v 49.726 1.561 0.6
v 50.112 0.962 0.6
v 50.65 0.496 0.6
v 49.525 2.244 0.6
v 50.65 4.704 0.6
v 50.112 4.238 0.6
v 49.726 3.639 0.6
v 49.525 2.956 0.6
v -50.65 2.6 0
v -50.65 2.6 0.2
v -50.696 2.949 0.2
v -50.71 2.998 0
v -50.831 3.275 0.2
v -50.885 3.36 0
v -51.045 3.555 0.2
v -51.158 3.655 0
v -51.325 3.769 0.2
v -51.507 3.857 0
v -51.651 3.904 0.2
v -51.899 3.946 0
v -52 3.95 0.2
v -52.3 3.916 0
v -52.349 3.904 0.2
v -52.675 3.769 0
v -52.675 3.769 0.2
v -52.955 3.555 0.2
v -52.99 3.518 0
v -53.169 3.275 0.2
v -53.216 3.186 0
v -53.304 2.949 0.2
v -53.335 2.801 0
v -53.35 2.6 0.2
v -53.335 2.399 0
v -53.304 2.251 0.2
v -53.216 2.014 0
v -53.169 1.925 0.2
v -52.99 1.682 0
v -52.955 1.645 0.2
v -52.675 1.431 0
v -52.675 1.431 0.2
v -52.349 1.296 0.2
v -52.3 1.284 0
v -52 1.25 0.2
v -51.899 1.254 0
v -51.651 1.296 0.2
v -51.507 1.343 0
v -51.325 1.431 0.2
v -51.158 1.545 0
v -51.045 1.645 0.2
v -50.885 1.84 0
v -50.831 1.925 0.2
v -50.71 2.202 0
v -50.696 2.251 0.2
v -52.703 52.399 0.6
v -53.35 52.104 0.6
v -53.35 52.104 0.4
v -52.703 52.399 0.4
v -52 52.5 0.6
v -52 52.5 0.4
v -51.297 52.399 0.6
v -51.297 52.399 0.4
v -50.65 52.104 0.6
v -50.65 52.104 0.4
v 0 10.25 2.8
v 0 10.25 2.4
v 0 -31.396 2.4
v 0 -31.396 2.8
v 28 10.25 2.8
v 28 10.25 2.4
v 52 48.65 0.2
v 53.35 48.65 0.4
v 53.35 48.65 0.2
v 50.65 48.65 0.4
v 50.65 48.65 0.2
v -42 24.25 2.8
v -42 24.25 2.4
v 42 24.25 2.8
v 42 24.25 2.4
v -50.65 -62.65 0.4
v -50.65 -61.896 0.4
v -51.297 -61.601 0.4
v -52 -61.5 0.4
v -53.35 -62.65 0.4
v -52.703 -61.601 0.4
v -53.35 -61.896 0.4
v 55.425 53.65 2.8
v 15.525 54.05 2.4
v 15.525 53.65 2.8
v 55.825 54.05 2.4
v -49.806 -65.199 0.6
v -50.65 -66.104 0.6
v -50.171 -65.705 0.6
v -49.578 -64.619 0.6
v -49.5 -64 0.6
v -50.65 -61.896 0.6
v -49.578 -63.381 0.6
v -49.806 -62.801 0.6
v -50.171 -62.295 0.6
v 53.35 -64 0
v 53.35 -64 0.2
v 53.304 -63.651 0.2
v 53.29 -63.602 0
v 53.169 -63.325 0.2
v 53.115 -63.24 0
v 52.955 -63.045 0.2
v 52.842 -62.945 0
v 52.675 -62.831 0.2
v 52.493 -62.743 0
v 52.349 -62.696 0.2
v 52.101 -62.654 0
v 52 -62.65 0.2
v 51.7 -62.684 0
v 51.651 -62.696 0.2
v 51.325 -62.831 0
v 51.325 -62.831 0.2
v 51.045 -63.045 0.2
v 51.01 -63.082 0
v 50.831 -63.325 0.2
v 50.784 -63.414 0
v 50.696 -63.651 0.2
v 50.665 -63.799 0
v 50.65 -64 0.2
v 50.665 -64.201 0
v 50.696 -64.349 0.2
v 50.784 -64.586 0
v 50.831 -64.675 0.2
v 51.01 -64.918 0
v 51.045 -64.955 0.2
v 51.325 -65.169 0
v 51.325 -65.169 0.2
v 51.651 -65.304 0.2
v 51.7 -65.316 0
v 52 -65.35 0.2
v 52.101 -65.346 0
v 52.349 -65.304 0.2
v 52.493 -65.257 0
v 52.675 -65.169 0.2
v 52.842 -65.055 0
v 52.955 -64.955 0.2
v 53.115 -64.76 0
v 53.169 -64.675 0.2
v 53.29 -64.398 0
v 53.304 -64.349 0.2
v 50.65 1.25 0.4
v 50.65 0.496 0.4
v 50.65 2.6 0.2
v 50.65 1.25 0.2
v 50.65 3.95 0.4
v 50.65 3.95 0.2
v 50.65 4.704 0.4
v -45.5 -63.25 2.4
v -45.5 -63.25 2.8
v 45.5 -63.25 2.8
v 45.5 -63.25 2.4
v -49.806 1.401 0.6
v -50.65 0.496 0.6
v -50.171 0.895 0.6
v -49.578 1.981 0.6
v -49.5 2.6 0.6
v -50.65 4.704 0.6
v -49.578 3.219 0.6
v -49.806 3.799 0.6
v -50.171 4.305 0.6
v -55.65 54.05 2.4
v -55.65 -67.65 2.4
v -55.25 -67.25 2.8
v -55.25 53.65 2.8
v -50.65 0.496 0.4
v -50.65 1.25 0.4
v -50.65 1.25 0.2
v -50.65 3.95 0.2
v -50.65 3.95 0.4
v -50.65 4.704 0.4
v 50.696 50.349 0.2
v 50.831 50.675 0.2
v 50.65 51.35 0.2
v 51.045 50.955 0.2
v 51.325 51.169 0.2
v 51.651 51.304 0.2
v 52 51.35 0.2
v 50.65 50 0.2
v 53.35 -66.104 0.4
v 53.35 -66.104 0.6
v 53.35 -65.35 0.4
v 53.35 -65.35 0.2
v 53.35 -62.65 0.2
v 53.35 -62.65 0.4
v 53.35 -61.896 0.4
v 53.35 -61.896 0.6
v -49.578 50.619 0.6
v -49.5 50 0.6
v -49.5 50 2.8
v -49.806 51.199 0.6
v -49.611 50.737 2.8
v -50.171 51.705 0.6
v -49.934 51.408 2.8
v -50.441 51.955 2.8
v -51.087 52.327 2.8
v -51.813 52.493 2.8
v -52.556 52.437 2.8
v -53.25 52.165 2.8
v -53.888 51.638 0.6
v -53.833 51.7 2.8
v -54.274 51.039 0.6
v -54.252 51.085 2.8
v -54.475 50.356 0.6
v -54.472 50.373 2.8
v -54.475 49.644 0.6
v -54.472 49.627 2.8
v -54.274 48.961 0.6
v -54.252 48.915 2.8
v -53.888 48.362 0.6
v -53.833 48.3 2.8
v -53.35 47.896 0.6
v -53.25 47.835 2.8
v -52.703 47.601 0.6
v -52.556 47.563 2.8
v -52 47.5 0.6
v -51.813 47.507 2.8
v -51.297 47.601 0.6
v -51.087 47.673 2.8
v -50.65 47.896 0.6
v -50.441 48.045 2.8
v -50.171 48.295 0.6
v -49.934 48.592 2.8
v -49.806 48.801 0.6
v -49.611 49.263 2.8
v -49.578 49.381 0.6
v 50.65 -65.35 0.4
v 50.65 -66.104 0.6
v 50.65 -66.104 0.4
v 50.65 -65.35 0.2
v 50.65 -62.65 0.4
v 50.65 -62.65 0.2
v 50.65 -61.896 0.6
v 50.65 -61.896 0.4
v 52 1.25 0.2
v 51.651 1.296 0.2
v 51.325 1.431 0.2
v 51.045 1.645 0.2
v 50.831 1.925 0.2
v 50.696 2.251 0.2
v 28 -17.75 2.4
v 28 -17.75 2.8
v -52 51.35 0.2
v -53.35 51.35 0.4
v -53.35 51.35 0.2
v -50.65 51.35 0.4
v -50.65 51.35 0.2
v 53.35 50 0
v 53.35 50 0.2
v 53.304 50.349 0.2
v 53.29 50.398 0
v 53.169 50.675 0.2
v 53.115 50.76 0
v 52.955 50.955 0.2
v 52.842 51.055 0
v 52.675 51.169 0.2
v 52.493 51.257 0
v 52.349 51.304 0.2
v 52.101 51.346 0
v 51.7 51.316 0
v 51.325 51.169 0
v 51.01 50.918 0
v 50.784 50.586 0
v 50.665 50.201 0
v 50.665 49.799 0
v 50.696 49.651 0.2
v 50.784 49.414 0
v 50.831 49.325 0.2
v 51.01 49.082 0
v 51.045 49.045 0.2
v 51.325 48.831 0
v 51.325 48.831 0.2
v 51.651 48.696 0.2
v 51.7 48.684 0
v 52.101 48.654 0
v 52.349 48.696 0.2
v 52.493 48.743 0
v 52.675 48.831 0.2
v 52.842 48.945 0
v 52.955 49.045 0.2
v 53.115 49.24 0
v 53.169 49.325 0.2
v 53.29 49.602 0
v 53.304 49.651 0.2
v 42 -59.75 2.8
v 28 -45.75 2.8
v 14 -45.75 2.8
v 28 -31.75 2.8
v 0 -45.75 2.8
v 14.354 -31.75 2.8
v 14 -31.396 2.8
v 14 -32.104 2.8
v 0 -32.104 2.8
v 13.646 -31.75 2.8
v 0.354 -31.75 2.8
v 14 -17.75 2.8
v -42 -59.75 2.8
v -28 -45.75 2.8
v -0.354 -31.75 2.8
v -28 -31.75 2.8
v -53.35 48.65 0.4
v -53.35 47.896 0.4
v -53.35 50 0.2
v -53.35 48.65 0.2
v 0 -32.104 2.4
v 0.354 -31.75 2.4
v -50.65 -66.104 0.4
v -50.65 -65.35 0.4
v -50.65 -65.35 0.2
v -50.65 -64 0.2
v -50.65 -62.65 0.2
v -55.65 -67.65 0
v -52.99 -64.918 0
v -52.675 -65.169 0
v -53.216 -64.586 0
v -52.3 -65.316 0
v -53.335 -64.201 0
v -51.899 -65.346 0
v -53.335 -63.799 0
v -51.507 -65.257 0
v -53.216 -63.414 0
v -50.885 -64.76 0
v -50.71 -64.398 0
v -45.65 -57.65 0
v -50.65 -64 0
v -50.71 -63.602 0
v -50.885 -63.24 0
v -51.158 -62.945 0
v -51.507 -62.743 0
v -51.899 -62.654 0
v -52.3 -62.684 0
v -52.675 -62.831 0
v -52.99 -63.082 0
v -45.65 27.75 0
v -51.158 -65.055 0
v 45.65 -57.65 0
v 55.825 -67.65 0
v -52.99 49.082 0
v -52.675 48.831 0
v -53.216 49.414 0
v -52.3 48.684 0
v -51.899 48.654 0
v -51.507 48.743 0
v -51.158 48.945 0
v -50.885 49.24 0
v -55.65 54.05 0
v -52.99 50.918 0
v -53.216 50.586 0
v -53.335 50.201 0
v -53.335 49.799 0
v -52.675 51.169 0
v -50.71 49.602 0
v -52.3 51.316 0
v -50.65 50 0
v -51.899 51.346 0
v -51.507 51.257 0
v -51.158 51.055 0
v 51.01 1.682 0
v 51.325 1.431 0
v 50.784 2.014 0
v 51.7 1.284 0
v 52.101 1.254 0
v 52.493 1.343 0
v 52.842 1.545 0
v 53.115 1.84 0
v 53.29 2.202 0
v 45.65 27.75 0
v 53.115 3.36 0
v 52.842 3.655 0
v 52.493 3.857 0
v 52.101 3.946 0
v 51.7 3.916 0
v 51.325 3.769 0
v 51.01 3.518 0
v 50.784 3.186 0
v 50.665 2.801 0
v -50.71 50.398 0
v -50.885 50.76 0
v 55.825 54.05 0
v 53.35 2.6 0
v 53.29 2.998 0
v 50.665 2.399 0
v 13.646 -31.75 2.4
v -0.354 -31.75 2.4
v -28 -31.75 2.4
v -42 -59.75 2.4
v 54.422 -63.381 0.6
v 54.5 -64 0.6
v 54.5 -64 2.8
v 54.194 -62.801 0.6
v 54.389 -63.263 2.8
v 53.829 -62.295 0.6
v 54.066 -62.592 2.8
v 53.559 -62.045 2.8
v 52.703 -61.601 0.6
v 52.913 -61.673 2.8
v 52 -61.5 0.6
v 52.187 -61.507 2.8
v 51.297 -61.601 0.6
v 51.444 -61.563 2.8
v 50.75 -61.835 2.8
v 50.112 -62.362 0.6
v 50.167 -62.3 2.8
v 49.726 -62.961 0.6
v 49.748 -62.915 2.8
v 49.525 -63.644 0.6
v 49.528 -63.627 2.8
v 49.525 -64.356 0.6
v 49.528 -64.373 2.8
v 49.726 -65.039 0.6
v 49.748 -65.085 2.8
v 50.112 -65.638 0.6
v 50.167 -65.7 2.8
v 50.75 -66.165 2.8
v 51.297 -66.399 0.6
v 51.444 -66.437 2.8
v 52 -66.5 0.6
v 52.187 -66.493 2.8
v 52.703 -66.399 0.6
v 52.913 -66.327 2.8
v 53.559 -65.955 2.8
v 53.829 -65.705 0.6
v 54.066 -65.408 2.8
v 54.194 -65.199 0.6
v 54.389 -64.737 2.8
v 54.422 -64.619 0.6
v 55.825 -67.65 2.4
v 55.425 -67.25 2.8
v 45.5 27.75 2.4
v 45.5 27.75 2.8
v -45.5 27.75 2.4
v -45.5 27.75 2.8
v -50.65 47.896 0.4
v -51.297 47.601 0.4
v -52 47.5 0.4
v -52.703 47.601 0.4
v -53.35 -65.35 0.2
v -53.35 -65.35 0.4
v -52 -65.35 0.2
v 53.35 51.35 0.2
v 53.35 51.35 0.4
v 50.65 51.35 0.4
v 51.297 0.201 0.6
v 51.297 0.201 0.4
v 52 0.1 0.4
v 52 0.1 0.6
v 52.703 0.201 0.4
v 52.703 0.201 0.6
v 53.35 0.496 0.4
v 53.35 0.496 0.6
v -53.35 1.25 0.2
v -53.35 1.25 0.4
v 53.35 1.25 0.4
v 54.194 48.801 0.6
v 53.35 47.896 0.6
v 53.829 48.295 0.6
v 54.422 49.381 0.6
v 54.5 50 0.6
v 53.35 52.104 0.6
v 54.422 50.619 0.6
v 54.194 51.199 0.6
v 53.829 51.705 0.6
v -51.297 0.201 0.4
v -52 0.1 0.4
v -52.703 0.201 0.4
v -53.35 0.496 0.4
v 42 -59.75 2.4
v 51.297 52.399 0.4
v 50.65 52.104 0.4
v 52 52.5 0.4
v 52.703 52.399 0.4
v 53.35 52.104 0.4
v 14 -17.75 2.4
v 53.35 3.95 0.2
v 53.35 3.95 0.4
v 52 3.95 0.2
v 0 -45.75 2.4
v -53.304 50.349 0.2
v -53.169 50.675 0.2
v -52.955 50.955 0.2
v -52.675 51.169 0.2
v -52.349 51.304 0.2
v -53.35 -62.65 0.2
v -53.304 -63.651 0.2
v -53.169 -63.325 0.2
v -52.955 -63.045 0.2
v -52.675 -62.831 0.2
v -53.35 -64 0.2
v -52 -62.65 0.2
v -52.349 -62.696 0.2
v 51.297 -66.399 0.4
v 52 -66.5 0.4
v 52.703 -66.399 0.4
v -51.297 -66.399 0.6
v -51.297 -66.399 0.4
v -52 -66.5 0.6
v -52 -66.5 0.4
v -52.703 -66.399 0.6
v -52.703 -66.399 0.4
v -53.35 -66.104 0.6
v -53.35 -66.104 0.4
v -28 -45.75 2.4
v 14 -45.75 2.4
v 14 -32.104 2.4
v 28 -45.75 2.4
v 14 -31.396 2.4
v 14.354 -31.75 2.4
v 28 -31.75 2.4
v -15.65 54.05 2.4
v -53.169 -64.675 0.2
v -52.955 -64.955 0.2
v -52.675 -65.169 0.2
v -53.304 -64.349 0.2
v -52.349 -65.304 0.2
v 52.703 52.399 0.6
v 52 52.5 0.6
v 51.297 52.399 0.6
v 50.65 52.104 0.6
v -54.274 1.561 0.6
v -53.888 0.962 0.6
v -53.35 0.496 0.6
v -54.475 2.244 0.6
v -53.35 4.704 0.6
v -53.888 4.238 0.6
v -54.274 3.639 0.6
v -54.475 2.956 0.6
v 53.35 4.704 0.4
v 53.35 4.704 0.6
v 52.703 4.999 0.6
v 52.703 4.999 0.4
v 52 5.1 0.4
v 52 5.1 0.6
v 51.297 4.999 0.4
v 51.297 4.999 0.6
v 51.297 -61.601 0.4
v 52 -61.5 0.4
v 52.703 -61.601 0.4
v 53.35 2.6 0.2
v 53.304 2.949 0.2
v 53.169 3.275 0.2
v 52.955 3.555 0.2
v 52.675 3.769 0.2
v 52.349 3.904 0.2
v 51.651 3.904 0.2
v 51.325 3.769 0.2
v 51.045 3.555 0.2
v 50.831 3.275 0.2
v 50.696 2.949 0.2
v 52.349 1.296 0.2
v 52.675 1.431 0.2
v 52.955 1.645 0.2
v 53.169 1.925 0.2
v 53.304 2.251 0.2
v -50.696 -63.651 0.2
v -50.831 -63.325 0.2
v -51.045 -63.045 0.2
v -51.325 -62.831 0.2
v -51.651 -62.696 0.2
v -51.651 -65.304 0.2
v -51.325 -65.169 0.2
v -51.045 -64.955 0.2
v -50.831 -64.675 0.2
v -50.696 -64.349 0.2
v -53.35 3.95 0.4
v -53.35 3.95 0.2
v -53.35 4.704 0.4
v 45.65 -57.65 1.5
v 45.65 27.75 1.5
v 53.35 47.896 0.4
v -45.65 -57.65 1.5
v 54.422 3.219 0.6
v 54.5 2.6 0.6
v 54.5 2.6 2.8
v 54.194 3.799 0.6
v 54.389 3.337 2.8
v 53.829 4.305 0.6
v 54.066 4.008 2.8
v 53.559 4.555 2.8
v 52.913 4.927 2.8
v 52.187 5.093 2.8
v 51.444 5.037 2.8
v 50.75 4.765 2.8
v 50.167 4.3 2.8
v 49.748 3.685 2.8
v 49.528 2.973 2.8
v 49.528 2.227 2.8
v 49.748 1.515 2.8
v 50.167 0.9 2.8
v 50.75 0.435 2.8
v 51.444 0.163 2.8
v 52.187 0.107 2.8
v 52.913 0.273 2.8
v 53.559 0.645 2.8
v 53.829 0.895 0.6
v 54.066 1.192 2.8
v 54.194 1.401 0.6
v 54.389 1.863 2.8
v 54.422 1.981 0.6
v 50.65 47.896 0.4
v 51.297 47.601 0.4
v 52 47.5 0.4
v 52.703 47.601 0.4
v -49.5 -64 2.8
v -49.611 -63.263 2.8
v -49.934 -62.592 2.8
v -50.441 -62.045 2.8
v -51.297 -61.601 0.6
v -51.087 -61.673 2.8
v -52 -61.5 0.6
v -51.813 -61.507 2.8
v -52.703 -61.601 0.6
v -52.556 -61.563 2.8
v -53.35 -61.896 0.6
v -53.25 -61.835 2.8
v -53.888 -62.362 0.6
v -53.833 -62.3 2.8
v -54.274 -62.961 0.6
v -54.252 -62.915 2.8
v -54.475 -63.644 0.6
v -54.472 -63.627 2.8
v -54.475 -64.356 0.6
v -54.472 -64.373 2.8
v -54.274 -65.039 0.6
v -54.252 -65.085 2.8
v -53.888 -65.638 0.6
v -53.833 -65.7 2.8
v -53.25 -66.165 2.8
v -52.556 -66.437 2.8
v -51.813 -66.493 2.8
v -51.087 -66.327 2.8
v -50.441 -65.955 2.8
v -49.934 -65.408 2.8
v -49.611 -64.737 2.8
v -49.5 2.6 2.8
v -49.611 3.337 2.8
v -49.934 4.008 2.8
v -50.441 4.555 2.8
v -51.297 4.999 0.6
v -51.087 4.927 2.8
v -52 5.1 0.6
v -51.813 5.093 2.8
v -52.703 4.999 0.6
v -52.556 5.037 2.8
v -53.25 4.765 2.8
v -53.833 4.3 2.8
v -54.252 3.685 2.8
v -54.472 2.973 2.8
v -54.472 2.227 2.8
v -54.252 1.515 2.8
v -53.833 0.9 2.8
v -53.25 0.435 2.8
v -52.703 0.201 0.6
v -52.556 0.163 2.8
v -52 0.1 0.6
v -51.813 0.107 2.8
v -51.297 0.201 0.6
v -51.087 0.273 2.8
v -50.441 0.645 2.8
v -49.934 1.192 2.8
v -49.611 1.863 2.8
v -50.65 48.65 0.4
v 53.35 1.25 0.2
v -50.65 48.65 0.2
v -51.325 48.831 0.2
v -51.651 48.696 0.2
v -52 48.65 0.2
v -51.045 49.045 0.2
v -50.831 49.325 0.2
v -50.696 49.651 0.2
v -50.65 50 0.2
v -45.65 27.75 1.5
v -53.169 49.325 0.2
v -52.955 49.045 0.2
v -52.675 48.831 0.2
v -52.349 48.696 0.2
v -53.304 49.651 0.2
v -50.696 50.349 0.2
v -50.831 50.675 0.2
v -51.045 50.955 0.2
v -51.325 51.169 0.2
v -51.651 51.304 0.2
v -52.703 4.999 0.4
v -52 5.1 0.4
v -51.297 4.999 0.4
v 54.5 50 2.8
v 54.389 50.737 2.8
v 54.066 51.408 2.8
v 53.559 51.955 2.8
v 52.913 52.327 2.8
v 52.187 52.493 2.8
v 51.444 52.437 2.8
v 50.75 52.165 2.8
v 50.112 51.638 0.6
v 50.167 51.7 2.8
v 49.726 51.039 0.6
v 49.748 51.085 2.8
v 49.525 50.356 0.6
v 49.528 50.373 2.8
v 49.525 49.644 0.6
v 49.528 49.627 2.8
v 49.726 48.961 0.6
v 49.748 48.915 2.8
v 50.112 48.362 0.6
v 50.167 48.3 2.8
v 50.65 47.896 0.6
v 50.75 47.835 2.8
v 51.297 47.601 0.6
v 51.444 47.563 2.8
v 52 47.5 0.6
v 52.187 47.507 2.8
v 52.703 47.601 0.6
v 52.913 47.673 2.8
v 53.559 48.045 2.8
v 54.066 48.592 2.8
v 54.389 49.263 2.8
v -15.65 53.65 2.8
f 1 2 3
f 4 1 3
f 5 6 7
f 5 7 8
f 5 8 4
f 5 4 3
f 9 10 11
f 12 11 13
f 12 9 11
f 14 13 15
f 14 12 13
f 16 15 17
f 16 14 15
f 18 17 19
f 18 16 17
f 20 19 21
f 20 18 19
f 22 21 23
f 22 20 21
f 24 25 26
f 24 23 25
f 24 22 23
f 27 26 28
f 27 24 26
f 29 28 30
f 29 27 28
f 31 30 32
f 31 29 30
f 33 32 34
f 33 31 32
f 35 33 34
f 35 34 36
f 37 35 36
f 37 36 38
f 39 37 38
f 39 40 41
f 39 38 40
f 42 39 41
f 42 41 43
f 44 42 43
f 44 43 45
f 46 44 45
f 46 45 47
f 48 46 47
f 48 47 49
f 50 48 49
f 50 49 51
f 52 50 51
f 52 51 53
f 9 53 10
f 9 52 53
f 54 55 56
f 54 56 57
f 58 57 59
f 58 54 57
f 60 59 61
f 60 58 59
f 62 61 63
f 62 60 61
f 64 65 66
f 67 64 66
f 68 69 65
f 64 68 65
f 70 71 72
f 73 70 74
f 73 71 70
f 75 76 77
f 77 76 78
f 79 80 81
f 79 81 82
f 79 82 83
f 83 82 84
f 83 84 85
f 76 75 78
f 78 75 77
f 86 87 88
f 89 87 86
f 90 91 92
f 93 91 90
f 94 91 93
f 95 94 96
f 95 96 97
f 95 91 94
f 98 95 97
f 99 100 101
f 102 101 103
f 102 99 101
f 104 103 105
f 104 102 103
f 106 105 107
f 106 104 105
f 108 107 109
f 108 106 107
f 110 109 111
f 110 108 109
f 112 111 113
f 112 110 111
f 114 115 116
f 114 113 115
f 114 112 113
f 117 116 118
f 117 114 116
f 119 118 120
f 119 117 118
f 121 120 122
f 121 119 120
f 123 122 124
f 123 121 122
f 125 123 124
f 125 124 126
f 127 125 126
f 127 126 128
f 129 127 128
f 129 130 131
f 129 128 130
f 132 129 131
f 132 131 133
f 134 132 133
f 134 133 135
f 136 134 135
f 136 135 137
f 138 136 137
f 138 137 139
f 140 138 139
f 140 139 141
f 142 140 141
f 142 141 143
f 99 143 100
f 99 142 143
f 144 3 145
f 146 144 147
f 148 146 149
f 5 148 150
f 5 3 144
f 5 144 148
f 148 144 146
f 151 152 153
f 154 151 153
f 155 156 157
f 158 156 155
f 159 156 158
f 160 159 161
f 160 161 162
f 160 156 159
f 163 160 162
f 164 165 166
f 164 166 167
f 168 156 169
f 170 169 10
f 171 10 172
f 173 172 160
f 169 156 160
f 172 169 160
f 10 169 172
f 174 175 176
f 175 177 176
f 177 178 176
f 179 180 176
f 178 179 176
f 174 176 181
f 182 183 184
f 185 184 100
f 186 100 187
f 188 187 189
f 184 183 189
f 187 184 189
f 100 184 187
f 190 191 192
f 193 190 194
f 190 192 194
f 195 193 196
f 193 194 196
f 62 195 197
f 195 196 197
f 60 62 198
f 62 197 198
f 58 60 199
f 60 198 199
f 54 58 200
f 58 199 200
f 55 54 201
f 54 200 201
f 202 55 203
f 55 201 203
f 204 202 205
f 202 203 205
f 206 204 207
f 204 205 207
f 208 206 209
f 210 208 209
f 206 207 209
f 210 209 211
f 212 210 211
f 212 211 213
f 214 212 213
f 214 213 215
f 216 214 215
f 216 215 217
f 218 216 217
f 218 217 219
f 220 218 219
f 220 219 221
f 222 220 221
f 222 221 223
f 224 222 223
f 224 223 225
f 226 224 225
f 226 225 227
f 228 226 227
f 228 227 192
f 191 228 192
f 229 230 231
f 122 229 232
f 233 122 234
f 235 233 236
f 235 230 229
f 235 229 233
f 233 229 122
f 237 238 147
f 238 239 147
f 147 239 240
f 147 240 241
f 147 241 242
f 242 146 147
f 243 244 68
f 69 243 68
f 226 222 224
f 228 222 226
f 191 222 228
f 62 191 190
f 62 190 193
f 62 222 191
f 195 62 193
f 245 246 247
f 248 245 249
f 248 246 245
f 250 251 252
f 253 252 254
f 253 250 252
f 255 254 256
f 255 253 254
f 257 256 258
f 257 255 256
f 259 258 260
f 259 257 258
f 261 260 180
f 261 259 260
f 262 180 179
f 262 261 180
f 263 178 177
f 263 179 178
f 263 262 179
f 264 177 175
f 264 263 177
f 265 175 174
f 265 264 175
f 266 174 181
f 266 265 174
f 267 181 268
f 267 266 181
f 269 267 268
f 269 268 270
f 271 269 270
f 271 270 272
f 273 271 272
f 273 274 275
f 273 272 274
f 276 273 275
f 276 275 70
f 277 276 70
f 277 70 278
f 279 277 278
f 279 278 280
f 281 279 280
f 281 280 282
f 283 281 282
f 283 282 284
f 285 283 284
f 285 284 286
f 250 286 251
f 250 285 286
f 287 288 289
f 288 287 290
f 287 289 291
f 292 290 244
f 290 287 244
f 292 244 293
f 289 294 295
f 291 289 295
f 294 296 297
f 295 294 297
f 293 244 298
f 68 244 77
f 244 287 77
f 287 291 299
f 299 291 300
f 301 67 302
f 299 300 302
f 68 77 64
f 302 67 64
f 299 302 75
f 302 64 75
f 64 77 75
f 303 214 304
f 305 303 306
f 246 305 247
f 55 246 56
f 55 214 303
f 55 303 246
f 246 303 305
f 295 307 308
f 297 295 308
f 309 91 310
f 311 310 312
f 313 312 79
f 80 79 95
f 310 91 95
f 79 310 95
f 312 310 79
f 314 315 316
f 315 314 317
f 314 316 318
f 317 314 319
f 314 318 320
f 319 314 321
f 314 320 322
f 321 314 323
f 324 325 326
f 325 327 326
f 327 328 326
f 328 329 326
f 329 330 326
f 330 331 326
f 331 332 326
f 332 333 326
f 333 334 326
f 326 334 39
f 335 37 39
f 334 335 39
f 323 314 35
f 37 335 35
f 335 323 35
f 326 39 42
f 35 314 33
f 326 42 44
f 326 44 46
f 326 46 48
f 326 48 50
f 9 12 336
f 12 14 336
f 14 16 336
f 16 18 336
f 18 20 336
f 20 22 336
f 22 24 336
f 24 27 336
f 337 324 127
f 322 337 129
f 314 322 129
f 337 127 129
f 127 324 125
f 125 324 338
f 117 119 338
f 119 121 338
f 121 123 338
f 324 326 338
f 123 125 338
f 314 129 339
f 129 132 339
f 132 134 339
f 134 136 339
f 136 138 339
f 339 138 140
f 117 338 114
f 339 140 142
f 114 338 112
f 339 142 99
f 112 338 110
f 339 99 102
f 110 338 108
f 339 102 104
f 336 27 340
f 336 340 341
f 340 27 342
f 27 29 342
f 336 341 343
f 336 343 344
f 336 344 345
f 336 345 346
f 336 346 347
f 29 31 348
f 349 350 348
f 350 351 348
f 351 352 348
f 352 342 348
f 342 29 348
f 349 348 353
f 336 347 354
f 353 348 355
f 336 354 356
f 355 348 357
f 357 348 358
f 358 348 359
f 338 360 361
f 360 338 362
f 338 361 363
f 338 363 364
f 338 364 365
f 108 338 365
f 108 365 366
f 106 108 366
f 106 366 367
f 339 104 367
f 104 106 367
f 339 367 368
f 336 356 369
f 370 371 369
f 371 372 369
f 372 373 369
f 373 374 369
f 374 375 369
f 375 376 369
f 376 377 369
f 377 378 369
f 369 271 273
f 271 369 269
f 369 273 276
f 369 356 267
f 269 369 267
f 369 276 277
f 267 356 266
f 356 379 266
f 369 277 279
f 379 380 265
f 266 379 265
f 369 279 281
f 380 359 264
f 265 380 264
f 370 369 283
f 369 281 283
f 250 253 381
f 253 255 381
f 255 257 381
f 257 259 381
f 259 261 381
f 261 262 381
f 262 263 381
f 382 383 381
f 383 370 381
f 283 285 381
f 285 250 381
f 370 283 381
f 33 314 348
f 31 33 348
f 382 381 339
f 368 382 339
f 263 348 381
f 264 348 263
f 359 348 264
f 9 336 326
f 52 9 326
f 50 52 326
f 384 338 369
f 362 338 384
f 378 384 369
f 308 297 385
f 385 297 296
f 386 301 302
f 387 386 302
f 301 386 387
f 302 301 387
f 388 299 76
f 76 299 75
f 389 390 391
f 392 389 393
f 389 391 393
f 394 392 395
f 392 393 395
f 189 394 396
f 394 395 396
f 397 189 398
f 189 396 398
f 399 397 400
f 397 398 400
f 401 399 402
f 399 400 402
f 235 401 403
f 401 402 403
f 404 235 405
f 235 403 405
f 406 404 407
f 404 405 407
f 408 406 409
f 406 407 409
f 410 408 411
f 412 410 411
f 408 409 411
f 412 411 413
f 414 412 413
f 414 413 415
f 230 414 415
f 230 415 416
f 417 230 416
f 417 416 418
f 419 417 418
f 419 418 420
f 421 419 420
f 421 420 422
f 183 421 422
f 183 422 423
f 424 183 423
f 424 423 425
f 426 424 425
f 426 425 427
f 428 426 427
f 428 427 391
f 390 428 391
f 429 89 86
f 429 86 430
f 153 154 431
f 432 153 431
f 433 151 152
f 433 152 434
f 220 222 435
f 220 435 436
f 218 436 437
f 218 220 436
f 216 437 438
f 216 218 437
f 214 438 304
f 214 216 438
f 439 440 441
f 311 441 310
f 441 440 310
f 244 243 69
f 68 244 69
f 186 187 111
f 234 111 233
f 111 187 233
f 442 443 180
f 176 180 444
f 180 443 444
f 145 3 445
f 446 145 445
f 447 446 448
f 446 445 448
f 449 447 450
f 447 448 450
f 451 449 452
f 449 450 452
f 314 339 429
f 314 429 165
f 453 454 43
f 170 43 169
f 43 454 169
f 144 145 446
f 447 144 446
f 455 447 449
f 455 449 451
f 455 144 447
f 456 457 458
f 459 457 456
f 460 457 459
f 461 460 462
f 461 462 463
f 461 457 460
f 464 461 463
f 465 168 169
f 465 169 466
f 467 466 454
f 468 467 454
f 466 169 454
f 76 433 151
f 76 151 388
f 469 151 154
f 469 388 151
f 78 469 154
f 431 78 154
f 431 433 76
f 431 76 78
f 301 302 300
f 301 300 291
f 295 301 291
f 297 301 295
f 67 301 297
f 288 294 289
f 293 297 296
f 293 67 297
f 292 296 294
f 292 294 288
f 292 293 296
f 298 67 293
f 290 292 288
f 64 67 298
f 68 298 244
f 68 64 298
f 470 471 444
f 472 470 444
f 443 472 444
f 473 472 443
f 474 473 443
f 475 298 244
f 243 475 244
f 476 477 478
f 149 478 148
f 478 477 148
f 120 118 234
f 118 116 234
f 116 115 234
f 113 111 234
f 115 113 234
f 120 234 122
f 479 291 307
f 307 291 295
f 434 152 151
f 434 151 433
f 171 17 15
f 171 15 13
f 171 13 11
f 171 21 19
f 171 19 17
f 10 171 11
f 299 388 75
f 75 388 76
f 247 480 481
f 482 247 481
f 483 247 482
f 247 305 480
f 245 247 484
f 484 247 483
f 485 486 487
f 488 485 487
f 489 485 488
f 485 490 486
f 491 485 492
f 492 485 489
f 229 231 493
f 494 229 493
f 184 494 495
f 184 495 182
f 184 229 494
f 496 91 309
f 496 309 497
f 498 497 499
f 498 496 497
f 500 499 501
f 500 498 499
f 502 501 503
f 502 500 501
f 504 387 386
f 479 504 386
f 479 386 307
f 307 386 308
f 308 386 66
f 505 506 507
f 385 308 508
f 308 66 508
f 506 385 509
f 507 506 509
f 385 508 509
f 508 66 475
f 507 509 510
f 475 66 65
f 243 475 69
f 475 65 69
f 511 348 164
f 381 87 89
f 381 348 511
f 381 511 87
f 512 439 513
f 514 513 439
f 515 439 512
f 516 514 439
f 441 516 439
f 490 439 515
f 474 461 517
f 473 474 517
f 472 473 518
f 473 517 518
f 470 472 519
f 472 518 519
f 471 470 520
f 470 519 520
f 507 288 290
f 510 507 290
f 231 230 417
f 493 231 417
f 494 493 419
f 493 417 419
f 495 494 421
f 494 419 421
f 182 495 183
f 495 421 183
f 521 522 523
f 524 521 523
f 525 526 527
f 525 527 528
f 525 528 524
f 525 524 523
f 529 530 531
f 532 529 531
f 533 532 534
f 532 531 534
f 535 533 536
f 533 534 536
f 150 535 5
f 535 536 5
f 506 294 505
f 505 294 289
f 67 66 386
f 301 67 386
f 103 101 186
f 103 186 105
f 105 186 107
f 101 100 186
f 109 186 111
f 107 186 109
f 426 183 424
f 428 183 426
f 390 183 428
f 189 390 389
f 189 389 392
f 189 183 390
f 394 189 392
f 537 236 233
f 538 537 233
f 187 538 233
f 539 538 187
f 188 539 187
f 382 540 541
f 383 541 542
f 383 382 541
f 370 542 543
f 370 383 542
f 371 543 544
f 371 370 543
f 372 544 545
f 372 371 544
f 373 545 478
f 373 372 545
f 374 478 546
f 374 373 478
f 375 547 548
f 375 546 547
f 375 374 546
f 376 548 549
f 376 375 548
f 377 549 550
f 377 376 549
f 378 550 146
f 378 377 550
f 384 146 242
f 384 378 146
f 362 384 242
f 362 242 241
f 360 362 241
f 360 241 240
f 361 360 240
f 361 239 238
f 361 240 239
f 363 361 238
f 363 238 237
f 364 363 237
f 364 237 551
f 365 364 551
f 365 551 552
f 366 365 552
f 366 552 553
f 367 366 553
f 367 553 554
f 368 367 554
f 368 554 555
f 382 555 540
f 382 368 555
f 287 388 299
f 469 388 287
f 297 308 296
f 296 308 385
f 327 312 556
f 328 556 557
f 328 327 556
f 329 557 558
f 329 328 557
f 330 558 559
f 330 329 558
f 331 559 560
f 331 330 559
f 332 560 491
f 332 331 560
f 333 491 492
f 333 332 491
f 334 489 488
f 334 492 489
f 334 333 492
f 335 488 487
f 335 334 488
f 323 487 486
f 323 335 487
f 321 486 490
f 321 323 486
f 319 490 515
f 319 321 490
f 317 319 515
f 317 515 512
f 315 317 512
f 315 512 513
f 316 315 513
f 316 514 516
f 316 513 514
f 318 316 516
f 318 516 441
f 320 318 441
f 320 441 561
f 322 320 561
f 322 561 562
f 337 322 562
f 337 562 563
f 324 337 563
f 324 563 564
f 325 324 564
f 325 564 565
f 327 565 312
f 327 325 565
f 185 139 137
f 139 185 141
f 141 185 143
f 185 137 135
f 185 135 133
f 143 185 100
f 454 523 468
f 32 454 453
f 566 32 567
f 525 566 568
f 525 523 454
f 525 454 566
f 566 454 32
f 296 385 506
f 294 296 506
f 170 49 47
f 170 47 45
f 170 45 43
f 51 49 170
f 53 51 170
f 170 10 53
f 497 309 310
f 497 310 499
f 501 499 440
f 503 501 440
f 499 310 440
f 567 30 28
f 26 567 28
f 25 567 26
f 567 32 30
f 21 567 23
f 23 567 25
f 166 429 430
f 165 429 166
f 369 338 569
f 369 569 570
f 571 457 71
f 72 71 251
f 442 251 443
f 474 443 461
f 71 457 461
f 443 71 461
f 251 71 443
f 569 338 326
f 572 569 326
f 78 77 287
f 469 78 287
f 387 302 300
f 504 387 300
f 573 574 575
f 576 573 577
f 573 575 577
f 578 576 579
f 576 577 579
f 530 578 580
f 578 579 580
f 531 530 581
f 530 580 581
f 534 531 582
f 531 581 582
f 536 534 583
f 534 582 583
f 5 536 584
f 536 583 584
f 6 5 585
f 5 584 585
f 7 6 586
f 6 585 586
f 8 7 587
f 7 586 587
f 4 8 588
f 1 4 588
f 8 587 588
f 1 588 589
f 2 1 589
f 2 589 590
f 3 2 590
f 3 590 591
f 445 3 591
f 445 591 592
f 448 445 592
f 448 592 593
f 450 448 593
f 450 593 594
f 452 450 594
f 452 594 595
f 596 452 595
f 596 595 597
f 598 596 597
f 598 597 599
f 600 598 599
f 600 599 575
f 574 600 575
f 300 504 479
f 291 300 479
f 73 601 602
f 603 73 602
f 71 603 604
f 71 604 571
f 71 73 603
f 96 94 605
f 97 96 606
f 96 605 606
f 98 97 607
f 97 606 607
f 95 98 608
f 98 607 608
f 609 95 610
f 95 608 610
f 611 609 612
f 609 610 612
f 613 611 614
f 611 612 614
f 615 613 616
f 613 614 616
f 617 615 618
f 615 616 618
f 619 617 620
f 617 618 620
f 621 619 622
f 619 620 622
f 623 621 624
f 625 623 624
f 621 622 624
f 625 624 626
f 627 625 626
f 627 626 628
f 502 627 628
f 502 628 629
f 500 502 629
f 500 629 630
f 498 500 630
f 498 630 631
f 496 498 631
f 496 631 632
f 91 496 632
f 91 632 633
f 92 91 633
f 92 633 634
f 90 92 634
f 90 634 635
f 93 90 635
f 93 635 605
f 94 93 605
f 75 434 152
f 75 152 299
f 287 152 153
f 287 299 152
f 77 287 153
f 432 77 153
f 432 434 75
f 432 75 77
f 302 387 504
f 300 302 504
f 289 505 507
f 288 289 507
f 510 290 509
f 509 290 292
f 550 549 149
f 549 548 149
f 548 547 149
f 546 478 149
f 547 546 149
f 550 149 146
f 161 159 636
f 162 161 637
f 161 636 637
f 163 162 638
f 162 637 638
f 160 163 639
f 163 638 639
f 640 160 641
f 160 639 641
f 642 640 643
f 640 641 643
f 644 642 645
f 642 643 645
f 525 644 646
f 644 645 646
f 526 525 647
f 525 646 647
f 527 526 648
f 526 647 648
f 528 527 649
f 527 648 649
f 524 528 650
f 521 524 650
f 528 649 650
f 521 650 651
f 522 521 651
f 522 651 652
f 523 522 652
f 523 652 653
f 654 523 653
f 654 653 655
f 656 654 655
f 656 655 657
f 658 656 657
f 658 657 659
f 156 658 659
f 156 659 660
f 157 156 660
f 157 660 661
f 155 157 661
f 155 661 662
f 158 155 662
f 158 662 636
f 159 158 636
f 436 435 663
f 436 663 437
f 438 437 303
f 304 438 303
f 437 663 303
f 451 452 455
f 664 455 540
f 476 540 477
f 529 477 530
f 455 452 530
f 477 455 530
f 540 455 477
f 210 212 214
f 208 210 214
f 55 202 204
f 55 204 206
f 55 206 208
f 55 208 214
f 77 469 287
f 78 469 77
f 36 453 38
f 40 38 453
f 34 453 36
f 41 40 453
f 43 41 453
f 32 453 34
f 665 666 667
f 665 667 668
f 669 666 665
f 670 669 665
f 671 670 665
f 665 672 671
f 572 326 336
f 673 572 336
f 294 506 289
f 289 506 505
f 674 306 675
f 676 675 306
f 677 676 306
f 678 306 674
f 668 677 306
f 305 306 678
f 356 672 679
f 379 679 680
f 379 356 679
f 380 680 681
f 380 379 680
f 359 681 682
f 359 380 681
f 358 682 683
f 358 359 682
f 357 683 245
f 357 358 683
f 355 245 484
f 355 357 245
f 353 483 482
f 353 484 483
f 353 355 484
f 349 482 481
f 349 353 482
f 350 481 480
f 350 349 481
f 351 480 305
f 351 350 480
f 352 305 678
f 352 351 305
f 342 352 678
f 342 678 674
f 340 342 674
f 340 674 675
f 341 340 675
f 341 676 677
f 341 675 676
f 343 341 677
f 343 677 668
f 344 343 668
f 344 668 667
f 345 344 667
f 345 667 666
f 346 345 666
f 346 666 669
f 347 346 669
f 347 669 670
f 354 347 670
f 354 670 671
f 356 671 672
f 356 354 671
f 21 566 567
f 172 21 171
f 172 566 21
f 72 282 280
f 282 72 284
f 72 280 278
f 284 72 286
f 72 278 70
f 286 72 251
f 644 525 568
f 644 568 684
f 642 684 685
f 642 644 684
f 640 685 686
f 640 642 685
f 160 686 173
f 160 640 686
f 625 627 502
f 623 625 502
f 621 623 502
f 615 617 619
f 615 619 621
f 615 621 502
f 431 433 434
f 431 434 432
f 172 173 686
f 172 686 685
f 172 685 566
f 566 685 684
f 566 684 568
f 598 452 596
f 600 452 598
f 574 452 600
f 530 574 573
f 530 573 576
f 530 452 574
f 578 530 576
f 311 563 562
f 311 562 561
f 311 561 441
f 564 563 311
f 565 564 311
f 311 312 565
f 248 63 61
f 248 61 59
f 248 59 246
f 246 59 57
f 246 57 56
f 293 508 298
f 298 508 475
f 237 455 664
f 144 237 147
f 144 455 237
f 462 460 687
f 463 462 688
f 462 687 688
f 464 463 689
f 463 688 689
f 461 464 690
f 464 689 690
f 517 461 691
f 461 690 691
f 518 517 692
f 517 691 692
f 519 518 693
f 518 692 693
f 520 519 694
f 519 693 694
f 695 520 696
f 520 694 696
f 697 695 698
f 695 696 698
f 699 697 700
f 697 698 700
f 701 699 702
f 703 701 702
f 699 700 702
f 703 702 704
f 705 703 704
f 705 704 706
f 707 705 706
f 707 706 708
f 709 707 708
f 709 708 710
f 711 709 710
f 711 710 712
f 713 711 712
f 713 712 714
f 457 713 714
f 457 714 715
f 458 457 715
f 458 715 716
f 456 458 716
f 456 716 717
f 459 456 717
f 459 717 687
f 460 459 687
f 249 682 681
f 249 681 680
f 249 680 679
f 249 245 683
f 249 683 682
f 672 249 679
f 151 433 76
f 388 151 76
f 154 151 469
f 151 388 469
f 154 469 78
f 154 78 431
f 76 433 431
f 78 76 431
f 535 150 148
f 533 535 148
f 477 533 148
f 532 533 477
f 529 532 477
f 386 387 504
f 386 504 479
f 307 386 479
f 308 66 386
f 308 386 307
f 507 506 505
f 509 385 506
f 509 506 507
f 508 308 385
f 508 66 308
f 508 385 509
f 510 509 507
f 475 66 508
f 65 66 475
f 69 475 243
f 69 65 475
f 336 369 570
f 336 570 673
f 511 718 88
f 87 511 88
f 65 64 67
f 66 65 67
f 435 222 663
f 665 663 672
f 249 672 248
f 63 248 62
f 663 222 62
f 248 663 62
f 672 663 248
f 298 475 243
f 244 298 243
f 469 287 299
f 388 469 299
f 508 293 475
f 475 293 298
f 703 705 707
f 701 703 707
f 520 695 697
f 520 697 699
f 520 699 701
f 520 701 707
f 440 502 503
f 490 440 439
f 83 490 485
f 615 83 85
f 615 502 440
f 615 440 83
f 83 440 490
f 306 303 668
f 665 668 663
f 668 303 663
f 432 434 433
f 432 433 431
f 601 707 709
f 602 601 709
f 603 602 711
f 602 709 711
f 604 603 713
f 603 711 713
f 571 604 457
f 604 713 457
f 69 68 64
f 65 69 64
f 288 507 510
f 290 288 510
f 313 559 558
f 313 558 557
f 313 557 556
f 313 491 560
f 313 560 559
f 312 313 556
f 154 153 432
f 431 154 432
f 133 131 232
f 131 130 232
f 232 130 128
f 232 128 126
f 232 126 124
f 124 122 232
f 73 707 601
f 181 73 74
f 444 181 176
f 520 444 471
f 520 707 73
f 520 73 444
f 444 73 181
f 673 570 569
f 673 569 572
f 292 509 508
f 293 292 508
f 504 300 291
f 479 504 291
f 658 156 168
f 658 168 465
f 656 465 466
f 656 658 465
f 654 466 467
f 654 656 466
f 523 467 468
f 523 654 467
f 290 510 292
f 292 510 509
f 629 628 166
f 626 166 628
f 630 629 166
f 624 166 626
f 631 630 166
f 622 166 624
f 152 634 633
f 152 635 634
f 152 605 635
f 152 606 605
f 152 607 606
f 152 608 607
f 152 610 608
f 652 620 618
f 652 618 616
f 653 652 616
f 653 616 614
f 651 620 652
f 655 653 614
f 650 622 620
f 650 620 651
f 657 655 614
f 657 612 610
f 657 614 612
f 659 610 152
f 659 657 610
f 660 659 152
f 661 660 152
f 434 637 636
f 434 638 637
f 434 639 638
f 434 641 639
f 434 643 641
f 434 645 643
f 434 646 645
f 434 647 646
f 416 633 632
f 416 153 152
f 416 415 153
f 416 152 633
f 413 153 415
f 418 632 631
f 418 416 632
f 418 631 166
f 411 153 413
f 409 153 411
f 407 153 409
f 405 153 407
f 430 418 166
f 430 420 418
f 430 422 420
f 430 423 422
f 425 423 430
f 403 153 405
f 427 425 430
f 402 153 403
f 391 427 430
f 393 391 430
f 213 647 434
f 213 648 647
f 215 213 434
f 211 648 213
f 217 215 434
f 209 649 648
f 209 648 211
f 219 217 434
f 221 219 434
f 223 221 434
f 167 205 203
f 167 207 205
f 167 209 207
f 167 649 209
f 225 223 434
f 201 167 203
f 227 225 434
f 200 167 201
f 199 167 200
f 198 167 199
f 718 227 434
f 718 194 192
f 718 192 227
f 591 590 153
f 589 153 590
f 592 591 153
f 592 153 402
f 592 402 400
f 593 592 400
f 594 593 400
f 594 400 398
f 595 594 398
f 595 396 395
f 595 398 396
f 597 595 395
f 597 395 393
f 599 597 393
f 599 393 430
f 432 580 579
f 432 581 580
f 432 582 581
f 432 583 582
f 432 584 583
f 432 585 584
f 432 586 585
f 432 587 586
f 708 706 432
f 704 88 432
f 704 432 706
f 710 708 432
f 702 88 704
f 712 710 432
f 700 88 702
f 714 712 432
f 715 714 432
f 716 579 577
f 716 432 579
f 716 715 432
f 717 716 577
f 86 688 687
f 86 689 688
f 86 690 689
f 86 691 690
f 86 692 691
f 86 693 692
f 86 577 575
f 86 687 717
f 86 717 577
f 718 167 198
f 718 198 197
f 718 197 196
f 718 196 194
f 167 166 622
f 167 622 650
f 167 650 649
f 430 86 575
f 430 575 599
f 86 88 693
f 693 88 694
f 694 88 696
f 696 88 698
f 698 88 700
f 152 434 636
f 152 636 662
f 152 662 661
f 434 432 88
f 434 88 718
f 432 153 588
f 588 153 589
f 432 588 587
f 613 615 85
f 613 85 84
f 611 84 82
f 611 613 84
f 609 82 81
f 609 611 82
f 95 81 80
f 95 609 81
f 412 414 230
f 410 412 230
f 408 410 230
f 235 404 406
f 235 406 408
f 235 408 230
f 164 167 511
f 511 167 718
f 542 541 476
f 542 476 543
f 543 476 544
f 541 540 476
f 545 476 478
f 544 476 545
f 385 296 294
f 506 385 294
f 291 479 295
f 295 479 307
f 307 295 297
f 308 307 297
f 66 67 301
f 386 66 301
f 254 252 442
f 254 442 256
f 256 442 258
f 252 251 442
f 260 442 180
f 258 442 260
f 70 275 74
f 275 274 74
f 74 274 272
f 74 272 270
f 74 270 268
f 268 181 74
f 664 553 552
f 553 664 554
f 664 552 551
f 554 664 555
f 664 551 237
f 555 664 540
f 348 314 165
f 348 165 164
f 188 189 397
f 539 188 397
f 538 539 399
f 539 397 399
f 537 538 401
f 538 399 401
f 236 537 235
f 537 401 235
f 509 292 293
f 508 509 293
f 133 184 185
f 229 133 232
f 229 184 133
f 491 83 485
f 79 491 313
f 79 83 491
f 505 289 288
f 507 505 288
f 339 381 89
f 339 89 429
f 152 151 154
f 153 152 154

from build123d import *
from build123d.topology import SkipClean

# Parameters (mm, degrees)
SKETCH1_R           = 1.35
BOSS_EXTRUDE1_DEPTH = 2.8
SKETCH3_R           = 2.5
CUT_EXTRUDE1_DEPTH  = 2.2
SKETCH4_W           = 91.3
SKETCH4_H           = 85.4
CUT_EXTRUDE2_DEPTH  = 1.5
CUT_EXTRUDE3_DEPTH  = 0.2
SKETCH6_W           = 2.7
SKETCH6_H           = 2.7
CUT_EXTRUDE4_DEPTH  = 0.2
CHAMFER1_SIZE       = 0.4
SKETCH7_W           = 91
SKETCH7_H           = 91
CUT_EXTRUDE5_DEPTH  = 0.4
SKETCH8_W           = 91
SKETCH8_H           = 91
SKETCH8_W_2         = 84
SKETCH8_H_2         = 84
BOSS_EXTRUDE2_DEPTH = 0.4
CUT_EXTRUDE6_DEPTH  = 0.4
BOSS_EXTRUDE3_DEPTH = 0.4
BOSS_EXTRUDE4_START = -2.8
SKETCH11_W          = 31.175
SKETCH11_H          = 25.7
BOSS_EXTRUDE4_DEPTH = 2.8
CHAMFER2_SIZE       = 0.4


with BuildPart() as part:
    # Sketch1 → Boss-Extrude1 (new body)
    with BuildSketch(Plane.XY):
        Polygon((-15.25, 54.05), (-15.25, 28.75), (15.125, 28.75), (15.125, 54.05), (55.825, 54.05), (55.825, -67.65), (-55.65, -67.65), (-55.65, 54.05), align=None)
        with Locations((-52, 50)):
            Circle(SKETCH1_R, mode=Mode.SUBTRACT)
        with Locations((-52, 2.6)):
            Circle(SKETCH1_R, mode=Mode.SUBTRACT)
        with Locations((-52, -64)):
            Circle(SKETCH1_R, mode=Mode.SUBTRACT)
        with Locations((52, 50)):
            Circle(SKETCH1_R, mode=Mode.SUBTRACT)
        with Locations((52, 2.6)):
            Circle(SKETCH1_R, mode=Mode.SUBTRACT)
        with Locations((52, -64)):
            Circle(SKETCH1_R, mode=Mode.SUBTRACT)
    extrude(amount=BOSS_EXTRUDE1_DEPTH)

    # Sketch3 → Cut-Extrude1 (cut)
    with BuildSketch(Plane.XY.offset(2.8)):
        with Locations((-52, 50)):
            Circle(SKETCH3_R)
        with Locations((-52, 2.6)):
            Circle(SKETCH3_R)
        with Locations((-52, -64)):
            Circle(SKETCH3_R)
        with Locations((52, -64)):
            Circle(SKETCH3_R)
        with Locations((52, 2.6)):
            Circle(SKETCH3_R)
        with Locations((52, 50)):
            Circle(SKETCH3_R)
    extrude(amount=-CUT_EXTRUDE1_DEPTH, mode=Mode.SUBTRACT)

    # Sketch4 → Cut-Extrude2 (cut)
    with BuildSketch(Plane(origin=(0, 0, 0), x_dir=(-1, 0, 0), z_dir=(0, 0, -1))):
        with Locations((0, -14.95)):
            Rectangle(SKETCH4_W, SKETCH4_H)
    extrude(amount=-CUT_EXTRUDE2_DEPTH, mode=Mode.SUBTRACT)

    # Sketch5 → Cut-Extrude3 (cut)
    with SkipClean():  # the faces are left unmerged after this step: merging them gives an invalid solid
        with BuildSketch(Plane.XY.offset(0.6)):
            with BuildLine():
                Line((-53.35, 47.895837459), (-53.35, 52.104162541))
                ThreePointArc((-53.35, 52.104162541), (-52, 52.5), (-50.65, 52.104162541))
                Line((-50.65, 52.104162541), (-50.65, 47.895837459))
                ThreePointArc((-50.65, 47.895837459), (-52, 47.5), (-53.35, 47.895837459))
            make_face()
            with BuildLine():
                Line((-53.35, 0.495837459), (-53.35, 4.704162541))
                ThreePointArc((-53.35, 4.704162541), (-52, 5.1), (-50.65, 4.704162541))
                Line((-50.65, 4.704162541), (-50.65, 0.495837459))
                ThreePointArc((-50.65, 0.495837459), (-52, 0.1), (-53.35, 0.495837459))
            make_face()
            with BuildLine():
                Line((-53.35, -66.104162541), (-53.35, -61.895837459))
                ThreePointArc((-53.35, -61.895837459), (-52, -61.5), (-50.65, -61.895837459))
                Line((-50.65, -61.895837459), (-50.65, -66.104162541))
                ThreePointArc((-50.65, -66.104162541), (-52, -66.5), (-53.35, -66.104162541))
            make_face()
        cut_extrude3 = extrude(amount=-CUT_EXTRUDE3_DEPTH, mode=Mode.SUBTRACT)

    # Sketch6 → Cut-Extrude4 (cut)
    with SkipClean():  # the faces are left unmerged after this step: merging them gives an invalid solid
        with BuildSketch(Plane.XY.offset(0.4)):
            with Locations((-52, -64)):
                Rectangle(SKETCH6_W, SKETCH6_H)
            with Locations((-52, 2.6)):
                Rectangle(SKETCH6_W, SKETCH6_H)
            with Locations((-52, 50)):
                Rectangle(SKETCH6_W, SKETCH6_H)
        cut_extrude4 = extrude(amount=-CUT_EXTRUDE4_DEPTH, mode=Mode.SUBTRACT)

    # Mirror1: Cut-Extrude3, Cut-Extrude4 across plane
    with SkipClean():  # the faces are left unmerged after this step: merging them gives an invalid solid
        add(cut_extrude3.mirror(Plane(origin=(0, 0, 0), x_dir=(0, 0, 1), z_dir=(1, 0, 0))), mode=Mode.SUBTRACT)
        add(cut_extrude4.mirror(Plane(origin=(0, 0, 0), x_dir=(0, 0, 1), z_dir=(1, 0, 0))), mode=Mode.SUBTRACT)

    # Chamfer1
    chamfer1_edges = [part.edges().sort_by_distance(p)[0] for p in [
        (55.825, -6.8, 2.8),
        (35.475, 54.05, 2.8),
        (15.125, 41.4, 2.8),
        (-0.0625, 28.75, 2.8),
        (-15.25, 41.4, 2.8),
        (-35.45, 54.05, 2.8),
        (-55.65, -6.8, 2.8),
        (0.0875, -67.65, 2.8),
    ]]
    chamfer(chamfer1_edges, length=CHAMFER1_SIZE)

    # Sketch7 → Cut-Extrude5 (cut)
    with SkipClean():  # the faces are left unmerged after this step: merging them gives an invalid solid
        with BuildSketch(Plane.XY.offset(2.8)):
            with Locations((0, -17.75)):
                Rectangle(SKETCH7_W, SKETCH7_H)
            Polygon((28, 24.25), (42, 24.25), (42, 10.25), (42, -3.75), (42, -17.75), (42, -31.75), (42, -45.75), (42, -59.75), (28, -59.75), (14, -59.75), (0, -59.75), (-14, -59.75), (-28, -59.75), (-42, -59.75), (-42, -45.75), (-42, -31.75), (-42, -17.75), (-42, -3.75), (-42, 10.25), (-42, 24.25), (-28, 24.25), (-14, 24.25), (0, 24.25), (14, 24.25), align=None, mode=Mode.SUBTRACT)
        extrude(amount=-CUT_EXTRUDE5_DEPTH, mode=Mode.SUBTRACT)

    # Sketch9 → Cut-Extrude6 (cut)
    with SkipClean():  # the faces are left unmerged after this step: merging them gives an invalid solid
        with BuildSketch(Plane.XY.offset(2.8)):
            Polygon((-28, -31.75), (-28, -45.75), (-14, -45.75), (0, -45.75), (0, -32.103553391), (0.353553391, -31.75), (13.646446609, -31.75), (14, -32.103553391), (14, -45.75), (28, -45.75), (28, -31.75), (14.353553391, -31.75), (14, -31.396446609), (14, -17.75), (28, -17.75), (28, -3.75), (28, 10.25), (14, 10.25), (0, 10.25), (0, -3.75), (0, -17.75), (0, -31.396446609), (-0.353553391, -31.75), (-14, -31.75), align=None)
        extrude(amount=-CUT_EXTRUDE6_DEPTH, mode=Mode.SUBTRACT)

    # Sketch11 → Boss-Extrude4 (add)
    with SkipClean():  # the faces are left unmerged after this step: merging them gives an invalid solid
        with BuildSketch(Plane.XY.offset(2.8).offset(BOSS_EXTRUDE4_START)):
            with Locations((-0.0625, 41.2)):
                Rectangle(SKETCH11_W, SKETCH11_H)
        extrude(amount=BOSS_EXTRUDE4_DEPTH)

    # Chamfer2
    chamfer2_edges = [part.edges().sort_by_distance(p)[0] for p in [
        (-0.0625, 54.05, 2.8),
    ]]
    chamfer(chamfer2_edges, length=CHAMFER2_SIZE - 0.0001)  # a hair under: the kernel refuses the full size


with BuildPart() as body_2:
    # Sketch8 → Boss-Extrude2 (new body)
    with BuildSketch(Plane.XY.offset(2.4)):
        with Locations((0, -17.75)):
            Rectangle(SKETCH8_W, SKETCH8_H)
        with Locations((0, -17.75)):
            Rectangle(SKETCH8_W_2, SKETCH8_H_2, mode=Mode.SUBTRACT)
    extrude(amount=BOSS_EXTRUDE2_DEPTH)


with BuildPart() as body_3:
    # Sketch10 → Boss-Extrude3 (new body)
    with BuildSketch(Plane.XY.offset(2.4)):
        Polygon((28, -31.75), (14.353553391, -31.75), (14, -31.396446609), (14, -17.75), (28, -17.75), (28, 10.25), (0, 10.25), (0, -31.396446609), (-0.353553391, -31.75), (-28, -31.75), (-28, -45.75), (0, -45.75), (0, -32.103553391), (0.353553391, -31.75), (13.646446609, -31.75), (14, -32.103553391), (14, -45.75), (28, -45.75), align=None)
    extrude(amount=BOSS_EXTRUDE3_DEPTH)


solid = Compound([part.part, body_2.part, body_3.part])
